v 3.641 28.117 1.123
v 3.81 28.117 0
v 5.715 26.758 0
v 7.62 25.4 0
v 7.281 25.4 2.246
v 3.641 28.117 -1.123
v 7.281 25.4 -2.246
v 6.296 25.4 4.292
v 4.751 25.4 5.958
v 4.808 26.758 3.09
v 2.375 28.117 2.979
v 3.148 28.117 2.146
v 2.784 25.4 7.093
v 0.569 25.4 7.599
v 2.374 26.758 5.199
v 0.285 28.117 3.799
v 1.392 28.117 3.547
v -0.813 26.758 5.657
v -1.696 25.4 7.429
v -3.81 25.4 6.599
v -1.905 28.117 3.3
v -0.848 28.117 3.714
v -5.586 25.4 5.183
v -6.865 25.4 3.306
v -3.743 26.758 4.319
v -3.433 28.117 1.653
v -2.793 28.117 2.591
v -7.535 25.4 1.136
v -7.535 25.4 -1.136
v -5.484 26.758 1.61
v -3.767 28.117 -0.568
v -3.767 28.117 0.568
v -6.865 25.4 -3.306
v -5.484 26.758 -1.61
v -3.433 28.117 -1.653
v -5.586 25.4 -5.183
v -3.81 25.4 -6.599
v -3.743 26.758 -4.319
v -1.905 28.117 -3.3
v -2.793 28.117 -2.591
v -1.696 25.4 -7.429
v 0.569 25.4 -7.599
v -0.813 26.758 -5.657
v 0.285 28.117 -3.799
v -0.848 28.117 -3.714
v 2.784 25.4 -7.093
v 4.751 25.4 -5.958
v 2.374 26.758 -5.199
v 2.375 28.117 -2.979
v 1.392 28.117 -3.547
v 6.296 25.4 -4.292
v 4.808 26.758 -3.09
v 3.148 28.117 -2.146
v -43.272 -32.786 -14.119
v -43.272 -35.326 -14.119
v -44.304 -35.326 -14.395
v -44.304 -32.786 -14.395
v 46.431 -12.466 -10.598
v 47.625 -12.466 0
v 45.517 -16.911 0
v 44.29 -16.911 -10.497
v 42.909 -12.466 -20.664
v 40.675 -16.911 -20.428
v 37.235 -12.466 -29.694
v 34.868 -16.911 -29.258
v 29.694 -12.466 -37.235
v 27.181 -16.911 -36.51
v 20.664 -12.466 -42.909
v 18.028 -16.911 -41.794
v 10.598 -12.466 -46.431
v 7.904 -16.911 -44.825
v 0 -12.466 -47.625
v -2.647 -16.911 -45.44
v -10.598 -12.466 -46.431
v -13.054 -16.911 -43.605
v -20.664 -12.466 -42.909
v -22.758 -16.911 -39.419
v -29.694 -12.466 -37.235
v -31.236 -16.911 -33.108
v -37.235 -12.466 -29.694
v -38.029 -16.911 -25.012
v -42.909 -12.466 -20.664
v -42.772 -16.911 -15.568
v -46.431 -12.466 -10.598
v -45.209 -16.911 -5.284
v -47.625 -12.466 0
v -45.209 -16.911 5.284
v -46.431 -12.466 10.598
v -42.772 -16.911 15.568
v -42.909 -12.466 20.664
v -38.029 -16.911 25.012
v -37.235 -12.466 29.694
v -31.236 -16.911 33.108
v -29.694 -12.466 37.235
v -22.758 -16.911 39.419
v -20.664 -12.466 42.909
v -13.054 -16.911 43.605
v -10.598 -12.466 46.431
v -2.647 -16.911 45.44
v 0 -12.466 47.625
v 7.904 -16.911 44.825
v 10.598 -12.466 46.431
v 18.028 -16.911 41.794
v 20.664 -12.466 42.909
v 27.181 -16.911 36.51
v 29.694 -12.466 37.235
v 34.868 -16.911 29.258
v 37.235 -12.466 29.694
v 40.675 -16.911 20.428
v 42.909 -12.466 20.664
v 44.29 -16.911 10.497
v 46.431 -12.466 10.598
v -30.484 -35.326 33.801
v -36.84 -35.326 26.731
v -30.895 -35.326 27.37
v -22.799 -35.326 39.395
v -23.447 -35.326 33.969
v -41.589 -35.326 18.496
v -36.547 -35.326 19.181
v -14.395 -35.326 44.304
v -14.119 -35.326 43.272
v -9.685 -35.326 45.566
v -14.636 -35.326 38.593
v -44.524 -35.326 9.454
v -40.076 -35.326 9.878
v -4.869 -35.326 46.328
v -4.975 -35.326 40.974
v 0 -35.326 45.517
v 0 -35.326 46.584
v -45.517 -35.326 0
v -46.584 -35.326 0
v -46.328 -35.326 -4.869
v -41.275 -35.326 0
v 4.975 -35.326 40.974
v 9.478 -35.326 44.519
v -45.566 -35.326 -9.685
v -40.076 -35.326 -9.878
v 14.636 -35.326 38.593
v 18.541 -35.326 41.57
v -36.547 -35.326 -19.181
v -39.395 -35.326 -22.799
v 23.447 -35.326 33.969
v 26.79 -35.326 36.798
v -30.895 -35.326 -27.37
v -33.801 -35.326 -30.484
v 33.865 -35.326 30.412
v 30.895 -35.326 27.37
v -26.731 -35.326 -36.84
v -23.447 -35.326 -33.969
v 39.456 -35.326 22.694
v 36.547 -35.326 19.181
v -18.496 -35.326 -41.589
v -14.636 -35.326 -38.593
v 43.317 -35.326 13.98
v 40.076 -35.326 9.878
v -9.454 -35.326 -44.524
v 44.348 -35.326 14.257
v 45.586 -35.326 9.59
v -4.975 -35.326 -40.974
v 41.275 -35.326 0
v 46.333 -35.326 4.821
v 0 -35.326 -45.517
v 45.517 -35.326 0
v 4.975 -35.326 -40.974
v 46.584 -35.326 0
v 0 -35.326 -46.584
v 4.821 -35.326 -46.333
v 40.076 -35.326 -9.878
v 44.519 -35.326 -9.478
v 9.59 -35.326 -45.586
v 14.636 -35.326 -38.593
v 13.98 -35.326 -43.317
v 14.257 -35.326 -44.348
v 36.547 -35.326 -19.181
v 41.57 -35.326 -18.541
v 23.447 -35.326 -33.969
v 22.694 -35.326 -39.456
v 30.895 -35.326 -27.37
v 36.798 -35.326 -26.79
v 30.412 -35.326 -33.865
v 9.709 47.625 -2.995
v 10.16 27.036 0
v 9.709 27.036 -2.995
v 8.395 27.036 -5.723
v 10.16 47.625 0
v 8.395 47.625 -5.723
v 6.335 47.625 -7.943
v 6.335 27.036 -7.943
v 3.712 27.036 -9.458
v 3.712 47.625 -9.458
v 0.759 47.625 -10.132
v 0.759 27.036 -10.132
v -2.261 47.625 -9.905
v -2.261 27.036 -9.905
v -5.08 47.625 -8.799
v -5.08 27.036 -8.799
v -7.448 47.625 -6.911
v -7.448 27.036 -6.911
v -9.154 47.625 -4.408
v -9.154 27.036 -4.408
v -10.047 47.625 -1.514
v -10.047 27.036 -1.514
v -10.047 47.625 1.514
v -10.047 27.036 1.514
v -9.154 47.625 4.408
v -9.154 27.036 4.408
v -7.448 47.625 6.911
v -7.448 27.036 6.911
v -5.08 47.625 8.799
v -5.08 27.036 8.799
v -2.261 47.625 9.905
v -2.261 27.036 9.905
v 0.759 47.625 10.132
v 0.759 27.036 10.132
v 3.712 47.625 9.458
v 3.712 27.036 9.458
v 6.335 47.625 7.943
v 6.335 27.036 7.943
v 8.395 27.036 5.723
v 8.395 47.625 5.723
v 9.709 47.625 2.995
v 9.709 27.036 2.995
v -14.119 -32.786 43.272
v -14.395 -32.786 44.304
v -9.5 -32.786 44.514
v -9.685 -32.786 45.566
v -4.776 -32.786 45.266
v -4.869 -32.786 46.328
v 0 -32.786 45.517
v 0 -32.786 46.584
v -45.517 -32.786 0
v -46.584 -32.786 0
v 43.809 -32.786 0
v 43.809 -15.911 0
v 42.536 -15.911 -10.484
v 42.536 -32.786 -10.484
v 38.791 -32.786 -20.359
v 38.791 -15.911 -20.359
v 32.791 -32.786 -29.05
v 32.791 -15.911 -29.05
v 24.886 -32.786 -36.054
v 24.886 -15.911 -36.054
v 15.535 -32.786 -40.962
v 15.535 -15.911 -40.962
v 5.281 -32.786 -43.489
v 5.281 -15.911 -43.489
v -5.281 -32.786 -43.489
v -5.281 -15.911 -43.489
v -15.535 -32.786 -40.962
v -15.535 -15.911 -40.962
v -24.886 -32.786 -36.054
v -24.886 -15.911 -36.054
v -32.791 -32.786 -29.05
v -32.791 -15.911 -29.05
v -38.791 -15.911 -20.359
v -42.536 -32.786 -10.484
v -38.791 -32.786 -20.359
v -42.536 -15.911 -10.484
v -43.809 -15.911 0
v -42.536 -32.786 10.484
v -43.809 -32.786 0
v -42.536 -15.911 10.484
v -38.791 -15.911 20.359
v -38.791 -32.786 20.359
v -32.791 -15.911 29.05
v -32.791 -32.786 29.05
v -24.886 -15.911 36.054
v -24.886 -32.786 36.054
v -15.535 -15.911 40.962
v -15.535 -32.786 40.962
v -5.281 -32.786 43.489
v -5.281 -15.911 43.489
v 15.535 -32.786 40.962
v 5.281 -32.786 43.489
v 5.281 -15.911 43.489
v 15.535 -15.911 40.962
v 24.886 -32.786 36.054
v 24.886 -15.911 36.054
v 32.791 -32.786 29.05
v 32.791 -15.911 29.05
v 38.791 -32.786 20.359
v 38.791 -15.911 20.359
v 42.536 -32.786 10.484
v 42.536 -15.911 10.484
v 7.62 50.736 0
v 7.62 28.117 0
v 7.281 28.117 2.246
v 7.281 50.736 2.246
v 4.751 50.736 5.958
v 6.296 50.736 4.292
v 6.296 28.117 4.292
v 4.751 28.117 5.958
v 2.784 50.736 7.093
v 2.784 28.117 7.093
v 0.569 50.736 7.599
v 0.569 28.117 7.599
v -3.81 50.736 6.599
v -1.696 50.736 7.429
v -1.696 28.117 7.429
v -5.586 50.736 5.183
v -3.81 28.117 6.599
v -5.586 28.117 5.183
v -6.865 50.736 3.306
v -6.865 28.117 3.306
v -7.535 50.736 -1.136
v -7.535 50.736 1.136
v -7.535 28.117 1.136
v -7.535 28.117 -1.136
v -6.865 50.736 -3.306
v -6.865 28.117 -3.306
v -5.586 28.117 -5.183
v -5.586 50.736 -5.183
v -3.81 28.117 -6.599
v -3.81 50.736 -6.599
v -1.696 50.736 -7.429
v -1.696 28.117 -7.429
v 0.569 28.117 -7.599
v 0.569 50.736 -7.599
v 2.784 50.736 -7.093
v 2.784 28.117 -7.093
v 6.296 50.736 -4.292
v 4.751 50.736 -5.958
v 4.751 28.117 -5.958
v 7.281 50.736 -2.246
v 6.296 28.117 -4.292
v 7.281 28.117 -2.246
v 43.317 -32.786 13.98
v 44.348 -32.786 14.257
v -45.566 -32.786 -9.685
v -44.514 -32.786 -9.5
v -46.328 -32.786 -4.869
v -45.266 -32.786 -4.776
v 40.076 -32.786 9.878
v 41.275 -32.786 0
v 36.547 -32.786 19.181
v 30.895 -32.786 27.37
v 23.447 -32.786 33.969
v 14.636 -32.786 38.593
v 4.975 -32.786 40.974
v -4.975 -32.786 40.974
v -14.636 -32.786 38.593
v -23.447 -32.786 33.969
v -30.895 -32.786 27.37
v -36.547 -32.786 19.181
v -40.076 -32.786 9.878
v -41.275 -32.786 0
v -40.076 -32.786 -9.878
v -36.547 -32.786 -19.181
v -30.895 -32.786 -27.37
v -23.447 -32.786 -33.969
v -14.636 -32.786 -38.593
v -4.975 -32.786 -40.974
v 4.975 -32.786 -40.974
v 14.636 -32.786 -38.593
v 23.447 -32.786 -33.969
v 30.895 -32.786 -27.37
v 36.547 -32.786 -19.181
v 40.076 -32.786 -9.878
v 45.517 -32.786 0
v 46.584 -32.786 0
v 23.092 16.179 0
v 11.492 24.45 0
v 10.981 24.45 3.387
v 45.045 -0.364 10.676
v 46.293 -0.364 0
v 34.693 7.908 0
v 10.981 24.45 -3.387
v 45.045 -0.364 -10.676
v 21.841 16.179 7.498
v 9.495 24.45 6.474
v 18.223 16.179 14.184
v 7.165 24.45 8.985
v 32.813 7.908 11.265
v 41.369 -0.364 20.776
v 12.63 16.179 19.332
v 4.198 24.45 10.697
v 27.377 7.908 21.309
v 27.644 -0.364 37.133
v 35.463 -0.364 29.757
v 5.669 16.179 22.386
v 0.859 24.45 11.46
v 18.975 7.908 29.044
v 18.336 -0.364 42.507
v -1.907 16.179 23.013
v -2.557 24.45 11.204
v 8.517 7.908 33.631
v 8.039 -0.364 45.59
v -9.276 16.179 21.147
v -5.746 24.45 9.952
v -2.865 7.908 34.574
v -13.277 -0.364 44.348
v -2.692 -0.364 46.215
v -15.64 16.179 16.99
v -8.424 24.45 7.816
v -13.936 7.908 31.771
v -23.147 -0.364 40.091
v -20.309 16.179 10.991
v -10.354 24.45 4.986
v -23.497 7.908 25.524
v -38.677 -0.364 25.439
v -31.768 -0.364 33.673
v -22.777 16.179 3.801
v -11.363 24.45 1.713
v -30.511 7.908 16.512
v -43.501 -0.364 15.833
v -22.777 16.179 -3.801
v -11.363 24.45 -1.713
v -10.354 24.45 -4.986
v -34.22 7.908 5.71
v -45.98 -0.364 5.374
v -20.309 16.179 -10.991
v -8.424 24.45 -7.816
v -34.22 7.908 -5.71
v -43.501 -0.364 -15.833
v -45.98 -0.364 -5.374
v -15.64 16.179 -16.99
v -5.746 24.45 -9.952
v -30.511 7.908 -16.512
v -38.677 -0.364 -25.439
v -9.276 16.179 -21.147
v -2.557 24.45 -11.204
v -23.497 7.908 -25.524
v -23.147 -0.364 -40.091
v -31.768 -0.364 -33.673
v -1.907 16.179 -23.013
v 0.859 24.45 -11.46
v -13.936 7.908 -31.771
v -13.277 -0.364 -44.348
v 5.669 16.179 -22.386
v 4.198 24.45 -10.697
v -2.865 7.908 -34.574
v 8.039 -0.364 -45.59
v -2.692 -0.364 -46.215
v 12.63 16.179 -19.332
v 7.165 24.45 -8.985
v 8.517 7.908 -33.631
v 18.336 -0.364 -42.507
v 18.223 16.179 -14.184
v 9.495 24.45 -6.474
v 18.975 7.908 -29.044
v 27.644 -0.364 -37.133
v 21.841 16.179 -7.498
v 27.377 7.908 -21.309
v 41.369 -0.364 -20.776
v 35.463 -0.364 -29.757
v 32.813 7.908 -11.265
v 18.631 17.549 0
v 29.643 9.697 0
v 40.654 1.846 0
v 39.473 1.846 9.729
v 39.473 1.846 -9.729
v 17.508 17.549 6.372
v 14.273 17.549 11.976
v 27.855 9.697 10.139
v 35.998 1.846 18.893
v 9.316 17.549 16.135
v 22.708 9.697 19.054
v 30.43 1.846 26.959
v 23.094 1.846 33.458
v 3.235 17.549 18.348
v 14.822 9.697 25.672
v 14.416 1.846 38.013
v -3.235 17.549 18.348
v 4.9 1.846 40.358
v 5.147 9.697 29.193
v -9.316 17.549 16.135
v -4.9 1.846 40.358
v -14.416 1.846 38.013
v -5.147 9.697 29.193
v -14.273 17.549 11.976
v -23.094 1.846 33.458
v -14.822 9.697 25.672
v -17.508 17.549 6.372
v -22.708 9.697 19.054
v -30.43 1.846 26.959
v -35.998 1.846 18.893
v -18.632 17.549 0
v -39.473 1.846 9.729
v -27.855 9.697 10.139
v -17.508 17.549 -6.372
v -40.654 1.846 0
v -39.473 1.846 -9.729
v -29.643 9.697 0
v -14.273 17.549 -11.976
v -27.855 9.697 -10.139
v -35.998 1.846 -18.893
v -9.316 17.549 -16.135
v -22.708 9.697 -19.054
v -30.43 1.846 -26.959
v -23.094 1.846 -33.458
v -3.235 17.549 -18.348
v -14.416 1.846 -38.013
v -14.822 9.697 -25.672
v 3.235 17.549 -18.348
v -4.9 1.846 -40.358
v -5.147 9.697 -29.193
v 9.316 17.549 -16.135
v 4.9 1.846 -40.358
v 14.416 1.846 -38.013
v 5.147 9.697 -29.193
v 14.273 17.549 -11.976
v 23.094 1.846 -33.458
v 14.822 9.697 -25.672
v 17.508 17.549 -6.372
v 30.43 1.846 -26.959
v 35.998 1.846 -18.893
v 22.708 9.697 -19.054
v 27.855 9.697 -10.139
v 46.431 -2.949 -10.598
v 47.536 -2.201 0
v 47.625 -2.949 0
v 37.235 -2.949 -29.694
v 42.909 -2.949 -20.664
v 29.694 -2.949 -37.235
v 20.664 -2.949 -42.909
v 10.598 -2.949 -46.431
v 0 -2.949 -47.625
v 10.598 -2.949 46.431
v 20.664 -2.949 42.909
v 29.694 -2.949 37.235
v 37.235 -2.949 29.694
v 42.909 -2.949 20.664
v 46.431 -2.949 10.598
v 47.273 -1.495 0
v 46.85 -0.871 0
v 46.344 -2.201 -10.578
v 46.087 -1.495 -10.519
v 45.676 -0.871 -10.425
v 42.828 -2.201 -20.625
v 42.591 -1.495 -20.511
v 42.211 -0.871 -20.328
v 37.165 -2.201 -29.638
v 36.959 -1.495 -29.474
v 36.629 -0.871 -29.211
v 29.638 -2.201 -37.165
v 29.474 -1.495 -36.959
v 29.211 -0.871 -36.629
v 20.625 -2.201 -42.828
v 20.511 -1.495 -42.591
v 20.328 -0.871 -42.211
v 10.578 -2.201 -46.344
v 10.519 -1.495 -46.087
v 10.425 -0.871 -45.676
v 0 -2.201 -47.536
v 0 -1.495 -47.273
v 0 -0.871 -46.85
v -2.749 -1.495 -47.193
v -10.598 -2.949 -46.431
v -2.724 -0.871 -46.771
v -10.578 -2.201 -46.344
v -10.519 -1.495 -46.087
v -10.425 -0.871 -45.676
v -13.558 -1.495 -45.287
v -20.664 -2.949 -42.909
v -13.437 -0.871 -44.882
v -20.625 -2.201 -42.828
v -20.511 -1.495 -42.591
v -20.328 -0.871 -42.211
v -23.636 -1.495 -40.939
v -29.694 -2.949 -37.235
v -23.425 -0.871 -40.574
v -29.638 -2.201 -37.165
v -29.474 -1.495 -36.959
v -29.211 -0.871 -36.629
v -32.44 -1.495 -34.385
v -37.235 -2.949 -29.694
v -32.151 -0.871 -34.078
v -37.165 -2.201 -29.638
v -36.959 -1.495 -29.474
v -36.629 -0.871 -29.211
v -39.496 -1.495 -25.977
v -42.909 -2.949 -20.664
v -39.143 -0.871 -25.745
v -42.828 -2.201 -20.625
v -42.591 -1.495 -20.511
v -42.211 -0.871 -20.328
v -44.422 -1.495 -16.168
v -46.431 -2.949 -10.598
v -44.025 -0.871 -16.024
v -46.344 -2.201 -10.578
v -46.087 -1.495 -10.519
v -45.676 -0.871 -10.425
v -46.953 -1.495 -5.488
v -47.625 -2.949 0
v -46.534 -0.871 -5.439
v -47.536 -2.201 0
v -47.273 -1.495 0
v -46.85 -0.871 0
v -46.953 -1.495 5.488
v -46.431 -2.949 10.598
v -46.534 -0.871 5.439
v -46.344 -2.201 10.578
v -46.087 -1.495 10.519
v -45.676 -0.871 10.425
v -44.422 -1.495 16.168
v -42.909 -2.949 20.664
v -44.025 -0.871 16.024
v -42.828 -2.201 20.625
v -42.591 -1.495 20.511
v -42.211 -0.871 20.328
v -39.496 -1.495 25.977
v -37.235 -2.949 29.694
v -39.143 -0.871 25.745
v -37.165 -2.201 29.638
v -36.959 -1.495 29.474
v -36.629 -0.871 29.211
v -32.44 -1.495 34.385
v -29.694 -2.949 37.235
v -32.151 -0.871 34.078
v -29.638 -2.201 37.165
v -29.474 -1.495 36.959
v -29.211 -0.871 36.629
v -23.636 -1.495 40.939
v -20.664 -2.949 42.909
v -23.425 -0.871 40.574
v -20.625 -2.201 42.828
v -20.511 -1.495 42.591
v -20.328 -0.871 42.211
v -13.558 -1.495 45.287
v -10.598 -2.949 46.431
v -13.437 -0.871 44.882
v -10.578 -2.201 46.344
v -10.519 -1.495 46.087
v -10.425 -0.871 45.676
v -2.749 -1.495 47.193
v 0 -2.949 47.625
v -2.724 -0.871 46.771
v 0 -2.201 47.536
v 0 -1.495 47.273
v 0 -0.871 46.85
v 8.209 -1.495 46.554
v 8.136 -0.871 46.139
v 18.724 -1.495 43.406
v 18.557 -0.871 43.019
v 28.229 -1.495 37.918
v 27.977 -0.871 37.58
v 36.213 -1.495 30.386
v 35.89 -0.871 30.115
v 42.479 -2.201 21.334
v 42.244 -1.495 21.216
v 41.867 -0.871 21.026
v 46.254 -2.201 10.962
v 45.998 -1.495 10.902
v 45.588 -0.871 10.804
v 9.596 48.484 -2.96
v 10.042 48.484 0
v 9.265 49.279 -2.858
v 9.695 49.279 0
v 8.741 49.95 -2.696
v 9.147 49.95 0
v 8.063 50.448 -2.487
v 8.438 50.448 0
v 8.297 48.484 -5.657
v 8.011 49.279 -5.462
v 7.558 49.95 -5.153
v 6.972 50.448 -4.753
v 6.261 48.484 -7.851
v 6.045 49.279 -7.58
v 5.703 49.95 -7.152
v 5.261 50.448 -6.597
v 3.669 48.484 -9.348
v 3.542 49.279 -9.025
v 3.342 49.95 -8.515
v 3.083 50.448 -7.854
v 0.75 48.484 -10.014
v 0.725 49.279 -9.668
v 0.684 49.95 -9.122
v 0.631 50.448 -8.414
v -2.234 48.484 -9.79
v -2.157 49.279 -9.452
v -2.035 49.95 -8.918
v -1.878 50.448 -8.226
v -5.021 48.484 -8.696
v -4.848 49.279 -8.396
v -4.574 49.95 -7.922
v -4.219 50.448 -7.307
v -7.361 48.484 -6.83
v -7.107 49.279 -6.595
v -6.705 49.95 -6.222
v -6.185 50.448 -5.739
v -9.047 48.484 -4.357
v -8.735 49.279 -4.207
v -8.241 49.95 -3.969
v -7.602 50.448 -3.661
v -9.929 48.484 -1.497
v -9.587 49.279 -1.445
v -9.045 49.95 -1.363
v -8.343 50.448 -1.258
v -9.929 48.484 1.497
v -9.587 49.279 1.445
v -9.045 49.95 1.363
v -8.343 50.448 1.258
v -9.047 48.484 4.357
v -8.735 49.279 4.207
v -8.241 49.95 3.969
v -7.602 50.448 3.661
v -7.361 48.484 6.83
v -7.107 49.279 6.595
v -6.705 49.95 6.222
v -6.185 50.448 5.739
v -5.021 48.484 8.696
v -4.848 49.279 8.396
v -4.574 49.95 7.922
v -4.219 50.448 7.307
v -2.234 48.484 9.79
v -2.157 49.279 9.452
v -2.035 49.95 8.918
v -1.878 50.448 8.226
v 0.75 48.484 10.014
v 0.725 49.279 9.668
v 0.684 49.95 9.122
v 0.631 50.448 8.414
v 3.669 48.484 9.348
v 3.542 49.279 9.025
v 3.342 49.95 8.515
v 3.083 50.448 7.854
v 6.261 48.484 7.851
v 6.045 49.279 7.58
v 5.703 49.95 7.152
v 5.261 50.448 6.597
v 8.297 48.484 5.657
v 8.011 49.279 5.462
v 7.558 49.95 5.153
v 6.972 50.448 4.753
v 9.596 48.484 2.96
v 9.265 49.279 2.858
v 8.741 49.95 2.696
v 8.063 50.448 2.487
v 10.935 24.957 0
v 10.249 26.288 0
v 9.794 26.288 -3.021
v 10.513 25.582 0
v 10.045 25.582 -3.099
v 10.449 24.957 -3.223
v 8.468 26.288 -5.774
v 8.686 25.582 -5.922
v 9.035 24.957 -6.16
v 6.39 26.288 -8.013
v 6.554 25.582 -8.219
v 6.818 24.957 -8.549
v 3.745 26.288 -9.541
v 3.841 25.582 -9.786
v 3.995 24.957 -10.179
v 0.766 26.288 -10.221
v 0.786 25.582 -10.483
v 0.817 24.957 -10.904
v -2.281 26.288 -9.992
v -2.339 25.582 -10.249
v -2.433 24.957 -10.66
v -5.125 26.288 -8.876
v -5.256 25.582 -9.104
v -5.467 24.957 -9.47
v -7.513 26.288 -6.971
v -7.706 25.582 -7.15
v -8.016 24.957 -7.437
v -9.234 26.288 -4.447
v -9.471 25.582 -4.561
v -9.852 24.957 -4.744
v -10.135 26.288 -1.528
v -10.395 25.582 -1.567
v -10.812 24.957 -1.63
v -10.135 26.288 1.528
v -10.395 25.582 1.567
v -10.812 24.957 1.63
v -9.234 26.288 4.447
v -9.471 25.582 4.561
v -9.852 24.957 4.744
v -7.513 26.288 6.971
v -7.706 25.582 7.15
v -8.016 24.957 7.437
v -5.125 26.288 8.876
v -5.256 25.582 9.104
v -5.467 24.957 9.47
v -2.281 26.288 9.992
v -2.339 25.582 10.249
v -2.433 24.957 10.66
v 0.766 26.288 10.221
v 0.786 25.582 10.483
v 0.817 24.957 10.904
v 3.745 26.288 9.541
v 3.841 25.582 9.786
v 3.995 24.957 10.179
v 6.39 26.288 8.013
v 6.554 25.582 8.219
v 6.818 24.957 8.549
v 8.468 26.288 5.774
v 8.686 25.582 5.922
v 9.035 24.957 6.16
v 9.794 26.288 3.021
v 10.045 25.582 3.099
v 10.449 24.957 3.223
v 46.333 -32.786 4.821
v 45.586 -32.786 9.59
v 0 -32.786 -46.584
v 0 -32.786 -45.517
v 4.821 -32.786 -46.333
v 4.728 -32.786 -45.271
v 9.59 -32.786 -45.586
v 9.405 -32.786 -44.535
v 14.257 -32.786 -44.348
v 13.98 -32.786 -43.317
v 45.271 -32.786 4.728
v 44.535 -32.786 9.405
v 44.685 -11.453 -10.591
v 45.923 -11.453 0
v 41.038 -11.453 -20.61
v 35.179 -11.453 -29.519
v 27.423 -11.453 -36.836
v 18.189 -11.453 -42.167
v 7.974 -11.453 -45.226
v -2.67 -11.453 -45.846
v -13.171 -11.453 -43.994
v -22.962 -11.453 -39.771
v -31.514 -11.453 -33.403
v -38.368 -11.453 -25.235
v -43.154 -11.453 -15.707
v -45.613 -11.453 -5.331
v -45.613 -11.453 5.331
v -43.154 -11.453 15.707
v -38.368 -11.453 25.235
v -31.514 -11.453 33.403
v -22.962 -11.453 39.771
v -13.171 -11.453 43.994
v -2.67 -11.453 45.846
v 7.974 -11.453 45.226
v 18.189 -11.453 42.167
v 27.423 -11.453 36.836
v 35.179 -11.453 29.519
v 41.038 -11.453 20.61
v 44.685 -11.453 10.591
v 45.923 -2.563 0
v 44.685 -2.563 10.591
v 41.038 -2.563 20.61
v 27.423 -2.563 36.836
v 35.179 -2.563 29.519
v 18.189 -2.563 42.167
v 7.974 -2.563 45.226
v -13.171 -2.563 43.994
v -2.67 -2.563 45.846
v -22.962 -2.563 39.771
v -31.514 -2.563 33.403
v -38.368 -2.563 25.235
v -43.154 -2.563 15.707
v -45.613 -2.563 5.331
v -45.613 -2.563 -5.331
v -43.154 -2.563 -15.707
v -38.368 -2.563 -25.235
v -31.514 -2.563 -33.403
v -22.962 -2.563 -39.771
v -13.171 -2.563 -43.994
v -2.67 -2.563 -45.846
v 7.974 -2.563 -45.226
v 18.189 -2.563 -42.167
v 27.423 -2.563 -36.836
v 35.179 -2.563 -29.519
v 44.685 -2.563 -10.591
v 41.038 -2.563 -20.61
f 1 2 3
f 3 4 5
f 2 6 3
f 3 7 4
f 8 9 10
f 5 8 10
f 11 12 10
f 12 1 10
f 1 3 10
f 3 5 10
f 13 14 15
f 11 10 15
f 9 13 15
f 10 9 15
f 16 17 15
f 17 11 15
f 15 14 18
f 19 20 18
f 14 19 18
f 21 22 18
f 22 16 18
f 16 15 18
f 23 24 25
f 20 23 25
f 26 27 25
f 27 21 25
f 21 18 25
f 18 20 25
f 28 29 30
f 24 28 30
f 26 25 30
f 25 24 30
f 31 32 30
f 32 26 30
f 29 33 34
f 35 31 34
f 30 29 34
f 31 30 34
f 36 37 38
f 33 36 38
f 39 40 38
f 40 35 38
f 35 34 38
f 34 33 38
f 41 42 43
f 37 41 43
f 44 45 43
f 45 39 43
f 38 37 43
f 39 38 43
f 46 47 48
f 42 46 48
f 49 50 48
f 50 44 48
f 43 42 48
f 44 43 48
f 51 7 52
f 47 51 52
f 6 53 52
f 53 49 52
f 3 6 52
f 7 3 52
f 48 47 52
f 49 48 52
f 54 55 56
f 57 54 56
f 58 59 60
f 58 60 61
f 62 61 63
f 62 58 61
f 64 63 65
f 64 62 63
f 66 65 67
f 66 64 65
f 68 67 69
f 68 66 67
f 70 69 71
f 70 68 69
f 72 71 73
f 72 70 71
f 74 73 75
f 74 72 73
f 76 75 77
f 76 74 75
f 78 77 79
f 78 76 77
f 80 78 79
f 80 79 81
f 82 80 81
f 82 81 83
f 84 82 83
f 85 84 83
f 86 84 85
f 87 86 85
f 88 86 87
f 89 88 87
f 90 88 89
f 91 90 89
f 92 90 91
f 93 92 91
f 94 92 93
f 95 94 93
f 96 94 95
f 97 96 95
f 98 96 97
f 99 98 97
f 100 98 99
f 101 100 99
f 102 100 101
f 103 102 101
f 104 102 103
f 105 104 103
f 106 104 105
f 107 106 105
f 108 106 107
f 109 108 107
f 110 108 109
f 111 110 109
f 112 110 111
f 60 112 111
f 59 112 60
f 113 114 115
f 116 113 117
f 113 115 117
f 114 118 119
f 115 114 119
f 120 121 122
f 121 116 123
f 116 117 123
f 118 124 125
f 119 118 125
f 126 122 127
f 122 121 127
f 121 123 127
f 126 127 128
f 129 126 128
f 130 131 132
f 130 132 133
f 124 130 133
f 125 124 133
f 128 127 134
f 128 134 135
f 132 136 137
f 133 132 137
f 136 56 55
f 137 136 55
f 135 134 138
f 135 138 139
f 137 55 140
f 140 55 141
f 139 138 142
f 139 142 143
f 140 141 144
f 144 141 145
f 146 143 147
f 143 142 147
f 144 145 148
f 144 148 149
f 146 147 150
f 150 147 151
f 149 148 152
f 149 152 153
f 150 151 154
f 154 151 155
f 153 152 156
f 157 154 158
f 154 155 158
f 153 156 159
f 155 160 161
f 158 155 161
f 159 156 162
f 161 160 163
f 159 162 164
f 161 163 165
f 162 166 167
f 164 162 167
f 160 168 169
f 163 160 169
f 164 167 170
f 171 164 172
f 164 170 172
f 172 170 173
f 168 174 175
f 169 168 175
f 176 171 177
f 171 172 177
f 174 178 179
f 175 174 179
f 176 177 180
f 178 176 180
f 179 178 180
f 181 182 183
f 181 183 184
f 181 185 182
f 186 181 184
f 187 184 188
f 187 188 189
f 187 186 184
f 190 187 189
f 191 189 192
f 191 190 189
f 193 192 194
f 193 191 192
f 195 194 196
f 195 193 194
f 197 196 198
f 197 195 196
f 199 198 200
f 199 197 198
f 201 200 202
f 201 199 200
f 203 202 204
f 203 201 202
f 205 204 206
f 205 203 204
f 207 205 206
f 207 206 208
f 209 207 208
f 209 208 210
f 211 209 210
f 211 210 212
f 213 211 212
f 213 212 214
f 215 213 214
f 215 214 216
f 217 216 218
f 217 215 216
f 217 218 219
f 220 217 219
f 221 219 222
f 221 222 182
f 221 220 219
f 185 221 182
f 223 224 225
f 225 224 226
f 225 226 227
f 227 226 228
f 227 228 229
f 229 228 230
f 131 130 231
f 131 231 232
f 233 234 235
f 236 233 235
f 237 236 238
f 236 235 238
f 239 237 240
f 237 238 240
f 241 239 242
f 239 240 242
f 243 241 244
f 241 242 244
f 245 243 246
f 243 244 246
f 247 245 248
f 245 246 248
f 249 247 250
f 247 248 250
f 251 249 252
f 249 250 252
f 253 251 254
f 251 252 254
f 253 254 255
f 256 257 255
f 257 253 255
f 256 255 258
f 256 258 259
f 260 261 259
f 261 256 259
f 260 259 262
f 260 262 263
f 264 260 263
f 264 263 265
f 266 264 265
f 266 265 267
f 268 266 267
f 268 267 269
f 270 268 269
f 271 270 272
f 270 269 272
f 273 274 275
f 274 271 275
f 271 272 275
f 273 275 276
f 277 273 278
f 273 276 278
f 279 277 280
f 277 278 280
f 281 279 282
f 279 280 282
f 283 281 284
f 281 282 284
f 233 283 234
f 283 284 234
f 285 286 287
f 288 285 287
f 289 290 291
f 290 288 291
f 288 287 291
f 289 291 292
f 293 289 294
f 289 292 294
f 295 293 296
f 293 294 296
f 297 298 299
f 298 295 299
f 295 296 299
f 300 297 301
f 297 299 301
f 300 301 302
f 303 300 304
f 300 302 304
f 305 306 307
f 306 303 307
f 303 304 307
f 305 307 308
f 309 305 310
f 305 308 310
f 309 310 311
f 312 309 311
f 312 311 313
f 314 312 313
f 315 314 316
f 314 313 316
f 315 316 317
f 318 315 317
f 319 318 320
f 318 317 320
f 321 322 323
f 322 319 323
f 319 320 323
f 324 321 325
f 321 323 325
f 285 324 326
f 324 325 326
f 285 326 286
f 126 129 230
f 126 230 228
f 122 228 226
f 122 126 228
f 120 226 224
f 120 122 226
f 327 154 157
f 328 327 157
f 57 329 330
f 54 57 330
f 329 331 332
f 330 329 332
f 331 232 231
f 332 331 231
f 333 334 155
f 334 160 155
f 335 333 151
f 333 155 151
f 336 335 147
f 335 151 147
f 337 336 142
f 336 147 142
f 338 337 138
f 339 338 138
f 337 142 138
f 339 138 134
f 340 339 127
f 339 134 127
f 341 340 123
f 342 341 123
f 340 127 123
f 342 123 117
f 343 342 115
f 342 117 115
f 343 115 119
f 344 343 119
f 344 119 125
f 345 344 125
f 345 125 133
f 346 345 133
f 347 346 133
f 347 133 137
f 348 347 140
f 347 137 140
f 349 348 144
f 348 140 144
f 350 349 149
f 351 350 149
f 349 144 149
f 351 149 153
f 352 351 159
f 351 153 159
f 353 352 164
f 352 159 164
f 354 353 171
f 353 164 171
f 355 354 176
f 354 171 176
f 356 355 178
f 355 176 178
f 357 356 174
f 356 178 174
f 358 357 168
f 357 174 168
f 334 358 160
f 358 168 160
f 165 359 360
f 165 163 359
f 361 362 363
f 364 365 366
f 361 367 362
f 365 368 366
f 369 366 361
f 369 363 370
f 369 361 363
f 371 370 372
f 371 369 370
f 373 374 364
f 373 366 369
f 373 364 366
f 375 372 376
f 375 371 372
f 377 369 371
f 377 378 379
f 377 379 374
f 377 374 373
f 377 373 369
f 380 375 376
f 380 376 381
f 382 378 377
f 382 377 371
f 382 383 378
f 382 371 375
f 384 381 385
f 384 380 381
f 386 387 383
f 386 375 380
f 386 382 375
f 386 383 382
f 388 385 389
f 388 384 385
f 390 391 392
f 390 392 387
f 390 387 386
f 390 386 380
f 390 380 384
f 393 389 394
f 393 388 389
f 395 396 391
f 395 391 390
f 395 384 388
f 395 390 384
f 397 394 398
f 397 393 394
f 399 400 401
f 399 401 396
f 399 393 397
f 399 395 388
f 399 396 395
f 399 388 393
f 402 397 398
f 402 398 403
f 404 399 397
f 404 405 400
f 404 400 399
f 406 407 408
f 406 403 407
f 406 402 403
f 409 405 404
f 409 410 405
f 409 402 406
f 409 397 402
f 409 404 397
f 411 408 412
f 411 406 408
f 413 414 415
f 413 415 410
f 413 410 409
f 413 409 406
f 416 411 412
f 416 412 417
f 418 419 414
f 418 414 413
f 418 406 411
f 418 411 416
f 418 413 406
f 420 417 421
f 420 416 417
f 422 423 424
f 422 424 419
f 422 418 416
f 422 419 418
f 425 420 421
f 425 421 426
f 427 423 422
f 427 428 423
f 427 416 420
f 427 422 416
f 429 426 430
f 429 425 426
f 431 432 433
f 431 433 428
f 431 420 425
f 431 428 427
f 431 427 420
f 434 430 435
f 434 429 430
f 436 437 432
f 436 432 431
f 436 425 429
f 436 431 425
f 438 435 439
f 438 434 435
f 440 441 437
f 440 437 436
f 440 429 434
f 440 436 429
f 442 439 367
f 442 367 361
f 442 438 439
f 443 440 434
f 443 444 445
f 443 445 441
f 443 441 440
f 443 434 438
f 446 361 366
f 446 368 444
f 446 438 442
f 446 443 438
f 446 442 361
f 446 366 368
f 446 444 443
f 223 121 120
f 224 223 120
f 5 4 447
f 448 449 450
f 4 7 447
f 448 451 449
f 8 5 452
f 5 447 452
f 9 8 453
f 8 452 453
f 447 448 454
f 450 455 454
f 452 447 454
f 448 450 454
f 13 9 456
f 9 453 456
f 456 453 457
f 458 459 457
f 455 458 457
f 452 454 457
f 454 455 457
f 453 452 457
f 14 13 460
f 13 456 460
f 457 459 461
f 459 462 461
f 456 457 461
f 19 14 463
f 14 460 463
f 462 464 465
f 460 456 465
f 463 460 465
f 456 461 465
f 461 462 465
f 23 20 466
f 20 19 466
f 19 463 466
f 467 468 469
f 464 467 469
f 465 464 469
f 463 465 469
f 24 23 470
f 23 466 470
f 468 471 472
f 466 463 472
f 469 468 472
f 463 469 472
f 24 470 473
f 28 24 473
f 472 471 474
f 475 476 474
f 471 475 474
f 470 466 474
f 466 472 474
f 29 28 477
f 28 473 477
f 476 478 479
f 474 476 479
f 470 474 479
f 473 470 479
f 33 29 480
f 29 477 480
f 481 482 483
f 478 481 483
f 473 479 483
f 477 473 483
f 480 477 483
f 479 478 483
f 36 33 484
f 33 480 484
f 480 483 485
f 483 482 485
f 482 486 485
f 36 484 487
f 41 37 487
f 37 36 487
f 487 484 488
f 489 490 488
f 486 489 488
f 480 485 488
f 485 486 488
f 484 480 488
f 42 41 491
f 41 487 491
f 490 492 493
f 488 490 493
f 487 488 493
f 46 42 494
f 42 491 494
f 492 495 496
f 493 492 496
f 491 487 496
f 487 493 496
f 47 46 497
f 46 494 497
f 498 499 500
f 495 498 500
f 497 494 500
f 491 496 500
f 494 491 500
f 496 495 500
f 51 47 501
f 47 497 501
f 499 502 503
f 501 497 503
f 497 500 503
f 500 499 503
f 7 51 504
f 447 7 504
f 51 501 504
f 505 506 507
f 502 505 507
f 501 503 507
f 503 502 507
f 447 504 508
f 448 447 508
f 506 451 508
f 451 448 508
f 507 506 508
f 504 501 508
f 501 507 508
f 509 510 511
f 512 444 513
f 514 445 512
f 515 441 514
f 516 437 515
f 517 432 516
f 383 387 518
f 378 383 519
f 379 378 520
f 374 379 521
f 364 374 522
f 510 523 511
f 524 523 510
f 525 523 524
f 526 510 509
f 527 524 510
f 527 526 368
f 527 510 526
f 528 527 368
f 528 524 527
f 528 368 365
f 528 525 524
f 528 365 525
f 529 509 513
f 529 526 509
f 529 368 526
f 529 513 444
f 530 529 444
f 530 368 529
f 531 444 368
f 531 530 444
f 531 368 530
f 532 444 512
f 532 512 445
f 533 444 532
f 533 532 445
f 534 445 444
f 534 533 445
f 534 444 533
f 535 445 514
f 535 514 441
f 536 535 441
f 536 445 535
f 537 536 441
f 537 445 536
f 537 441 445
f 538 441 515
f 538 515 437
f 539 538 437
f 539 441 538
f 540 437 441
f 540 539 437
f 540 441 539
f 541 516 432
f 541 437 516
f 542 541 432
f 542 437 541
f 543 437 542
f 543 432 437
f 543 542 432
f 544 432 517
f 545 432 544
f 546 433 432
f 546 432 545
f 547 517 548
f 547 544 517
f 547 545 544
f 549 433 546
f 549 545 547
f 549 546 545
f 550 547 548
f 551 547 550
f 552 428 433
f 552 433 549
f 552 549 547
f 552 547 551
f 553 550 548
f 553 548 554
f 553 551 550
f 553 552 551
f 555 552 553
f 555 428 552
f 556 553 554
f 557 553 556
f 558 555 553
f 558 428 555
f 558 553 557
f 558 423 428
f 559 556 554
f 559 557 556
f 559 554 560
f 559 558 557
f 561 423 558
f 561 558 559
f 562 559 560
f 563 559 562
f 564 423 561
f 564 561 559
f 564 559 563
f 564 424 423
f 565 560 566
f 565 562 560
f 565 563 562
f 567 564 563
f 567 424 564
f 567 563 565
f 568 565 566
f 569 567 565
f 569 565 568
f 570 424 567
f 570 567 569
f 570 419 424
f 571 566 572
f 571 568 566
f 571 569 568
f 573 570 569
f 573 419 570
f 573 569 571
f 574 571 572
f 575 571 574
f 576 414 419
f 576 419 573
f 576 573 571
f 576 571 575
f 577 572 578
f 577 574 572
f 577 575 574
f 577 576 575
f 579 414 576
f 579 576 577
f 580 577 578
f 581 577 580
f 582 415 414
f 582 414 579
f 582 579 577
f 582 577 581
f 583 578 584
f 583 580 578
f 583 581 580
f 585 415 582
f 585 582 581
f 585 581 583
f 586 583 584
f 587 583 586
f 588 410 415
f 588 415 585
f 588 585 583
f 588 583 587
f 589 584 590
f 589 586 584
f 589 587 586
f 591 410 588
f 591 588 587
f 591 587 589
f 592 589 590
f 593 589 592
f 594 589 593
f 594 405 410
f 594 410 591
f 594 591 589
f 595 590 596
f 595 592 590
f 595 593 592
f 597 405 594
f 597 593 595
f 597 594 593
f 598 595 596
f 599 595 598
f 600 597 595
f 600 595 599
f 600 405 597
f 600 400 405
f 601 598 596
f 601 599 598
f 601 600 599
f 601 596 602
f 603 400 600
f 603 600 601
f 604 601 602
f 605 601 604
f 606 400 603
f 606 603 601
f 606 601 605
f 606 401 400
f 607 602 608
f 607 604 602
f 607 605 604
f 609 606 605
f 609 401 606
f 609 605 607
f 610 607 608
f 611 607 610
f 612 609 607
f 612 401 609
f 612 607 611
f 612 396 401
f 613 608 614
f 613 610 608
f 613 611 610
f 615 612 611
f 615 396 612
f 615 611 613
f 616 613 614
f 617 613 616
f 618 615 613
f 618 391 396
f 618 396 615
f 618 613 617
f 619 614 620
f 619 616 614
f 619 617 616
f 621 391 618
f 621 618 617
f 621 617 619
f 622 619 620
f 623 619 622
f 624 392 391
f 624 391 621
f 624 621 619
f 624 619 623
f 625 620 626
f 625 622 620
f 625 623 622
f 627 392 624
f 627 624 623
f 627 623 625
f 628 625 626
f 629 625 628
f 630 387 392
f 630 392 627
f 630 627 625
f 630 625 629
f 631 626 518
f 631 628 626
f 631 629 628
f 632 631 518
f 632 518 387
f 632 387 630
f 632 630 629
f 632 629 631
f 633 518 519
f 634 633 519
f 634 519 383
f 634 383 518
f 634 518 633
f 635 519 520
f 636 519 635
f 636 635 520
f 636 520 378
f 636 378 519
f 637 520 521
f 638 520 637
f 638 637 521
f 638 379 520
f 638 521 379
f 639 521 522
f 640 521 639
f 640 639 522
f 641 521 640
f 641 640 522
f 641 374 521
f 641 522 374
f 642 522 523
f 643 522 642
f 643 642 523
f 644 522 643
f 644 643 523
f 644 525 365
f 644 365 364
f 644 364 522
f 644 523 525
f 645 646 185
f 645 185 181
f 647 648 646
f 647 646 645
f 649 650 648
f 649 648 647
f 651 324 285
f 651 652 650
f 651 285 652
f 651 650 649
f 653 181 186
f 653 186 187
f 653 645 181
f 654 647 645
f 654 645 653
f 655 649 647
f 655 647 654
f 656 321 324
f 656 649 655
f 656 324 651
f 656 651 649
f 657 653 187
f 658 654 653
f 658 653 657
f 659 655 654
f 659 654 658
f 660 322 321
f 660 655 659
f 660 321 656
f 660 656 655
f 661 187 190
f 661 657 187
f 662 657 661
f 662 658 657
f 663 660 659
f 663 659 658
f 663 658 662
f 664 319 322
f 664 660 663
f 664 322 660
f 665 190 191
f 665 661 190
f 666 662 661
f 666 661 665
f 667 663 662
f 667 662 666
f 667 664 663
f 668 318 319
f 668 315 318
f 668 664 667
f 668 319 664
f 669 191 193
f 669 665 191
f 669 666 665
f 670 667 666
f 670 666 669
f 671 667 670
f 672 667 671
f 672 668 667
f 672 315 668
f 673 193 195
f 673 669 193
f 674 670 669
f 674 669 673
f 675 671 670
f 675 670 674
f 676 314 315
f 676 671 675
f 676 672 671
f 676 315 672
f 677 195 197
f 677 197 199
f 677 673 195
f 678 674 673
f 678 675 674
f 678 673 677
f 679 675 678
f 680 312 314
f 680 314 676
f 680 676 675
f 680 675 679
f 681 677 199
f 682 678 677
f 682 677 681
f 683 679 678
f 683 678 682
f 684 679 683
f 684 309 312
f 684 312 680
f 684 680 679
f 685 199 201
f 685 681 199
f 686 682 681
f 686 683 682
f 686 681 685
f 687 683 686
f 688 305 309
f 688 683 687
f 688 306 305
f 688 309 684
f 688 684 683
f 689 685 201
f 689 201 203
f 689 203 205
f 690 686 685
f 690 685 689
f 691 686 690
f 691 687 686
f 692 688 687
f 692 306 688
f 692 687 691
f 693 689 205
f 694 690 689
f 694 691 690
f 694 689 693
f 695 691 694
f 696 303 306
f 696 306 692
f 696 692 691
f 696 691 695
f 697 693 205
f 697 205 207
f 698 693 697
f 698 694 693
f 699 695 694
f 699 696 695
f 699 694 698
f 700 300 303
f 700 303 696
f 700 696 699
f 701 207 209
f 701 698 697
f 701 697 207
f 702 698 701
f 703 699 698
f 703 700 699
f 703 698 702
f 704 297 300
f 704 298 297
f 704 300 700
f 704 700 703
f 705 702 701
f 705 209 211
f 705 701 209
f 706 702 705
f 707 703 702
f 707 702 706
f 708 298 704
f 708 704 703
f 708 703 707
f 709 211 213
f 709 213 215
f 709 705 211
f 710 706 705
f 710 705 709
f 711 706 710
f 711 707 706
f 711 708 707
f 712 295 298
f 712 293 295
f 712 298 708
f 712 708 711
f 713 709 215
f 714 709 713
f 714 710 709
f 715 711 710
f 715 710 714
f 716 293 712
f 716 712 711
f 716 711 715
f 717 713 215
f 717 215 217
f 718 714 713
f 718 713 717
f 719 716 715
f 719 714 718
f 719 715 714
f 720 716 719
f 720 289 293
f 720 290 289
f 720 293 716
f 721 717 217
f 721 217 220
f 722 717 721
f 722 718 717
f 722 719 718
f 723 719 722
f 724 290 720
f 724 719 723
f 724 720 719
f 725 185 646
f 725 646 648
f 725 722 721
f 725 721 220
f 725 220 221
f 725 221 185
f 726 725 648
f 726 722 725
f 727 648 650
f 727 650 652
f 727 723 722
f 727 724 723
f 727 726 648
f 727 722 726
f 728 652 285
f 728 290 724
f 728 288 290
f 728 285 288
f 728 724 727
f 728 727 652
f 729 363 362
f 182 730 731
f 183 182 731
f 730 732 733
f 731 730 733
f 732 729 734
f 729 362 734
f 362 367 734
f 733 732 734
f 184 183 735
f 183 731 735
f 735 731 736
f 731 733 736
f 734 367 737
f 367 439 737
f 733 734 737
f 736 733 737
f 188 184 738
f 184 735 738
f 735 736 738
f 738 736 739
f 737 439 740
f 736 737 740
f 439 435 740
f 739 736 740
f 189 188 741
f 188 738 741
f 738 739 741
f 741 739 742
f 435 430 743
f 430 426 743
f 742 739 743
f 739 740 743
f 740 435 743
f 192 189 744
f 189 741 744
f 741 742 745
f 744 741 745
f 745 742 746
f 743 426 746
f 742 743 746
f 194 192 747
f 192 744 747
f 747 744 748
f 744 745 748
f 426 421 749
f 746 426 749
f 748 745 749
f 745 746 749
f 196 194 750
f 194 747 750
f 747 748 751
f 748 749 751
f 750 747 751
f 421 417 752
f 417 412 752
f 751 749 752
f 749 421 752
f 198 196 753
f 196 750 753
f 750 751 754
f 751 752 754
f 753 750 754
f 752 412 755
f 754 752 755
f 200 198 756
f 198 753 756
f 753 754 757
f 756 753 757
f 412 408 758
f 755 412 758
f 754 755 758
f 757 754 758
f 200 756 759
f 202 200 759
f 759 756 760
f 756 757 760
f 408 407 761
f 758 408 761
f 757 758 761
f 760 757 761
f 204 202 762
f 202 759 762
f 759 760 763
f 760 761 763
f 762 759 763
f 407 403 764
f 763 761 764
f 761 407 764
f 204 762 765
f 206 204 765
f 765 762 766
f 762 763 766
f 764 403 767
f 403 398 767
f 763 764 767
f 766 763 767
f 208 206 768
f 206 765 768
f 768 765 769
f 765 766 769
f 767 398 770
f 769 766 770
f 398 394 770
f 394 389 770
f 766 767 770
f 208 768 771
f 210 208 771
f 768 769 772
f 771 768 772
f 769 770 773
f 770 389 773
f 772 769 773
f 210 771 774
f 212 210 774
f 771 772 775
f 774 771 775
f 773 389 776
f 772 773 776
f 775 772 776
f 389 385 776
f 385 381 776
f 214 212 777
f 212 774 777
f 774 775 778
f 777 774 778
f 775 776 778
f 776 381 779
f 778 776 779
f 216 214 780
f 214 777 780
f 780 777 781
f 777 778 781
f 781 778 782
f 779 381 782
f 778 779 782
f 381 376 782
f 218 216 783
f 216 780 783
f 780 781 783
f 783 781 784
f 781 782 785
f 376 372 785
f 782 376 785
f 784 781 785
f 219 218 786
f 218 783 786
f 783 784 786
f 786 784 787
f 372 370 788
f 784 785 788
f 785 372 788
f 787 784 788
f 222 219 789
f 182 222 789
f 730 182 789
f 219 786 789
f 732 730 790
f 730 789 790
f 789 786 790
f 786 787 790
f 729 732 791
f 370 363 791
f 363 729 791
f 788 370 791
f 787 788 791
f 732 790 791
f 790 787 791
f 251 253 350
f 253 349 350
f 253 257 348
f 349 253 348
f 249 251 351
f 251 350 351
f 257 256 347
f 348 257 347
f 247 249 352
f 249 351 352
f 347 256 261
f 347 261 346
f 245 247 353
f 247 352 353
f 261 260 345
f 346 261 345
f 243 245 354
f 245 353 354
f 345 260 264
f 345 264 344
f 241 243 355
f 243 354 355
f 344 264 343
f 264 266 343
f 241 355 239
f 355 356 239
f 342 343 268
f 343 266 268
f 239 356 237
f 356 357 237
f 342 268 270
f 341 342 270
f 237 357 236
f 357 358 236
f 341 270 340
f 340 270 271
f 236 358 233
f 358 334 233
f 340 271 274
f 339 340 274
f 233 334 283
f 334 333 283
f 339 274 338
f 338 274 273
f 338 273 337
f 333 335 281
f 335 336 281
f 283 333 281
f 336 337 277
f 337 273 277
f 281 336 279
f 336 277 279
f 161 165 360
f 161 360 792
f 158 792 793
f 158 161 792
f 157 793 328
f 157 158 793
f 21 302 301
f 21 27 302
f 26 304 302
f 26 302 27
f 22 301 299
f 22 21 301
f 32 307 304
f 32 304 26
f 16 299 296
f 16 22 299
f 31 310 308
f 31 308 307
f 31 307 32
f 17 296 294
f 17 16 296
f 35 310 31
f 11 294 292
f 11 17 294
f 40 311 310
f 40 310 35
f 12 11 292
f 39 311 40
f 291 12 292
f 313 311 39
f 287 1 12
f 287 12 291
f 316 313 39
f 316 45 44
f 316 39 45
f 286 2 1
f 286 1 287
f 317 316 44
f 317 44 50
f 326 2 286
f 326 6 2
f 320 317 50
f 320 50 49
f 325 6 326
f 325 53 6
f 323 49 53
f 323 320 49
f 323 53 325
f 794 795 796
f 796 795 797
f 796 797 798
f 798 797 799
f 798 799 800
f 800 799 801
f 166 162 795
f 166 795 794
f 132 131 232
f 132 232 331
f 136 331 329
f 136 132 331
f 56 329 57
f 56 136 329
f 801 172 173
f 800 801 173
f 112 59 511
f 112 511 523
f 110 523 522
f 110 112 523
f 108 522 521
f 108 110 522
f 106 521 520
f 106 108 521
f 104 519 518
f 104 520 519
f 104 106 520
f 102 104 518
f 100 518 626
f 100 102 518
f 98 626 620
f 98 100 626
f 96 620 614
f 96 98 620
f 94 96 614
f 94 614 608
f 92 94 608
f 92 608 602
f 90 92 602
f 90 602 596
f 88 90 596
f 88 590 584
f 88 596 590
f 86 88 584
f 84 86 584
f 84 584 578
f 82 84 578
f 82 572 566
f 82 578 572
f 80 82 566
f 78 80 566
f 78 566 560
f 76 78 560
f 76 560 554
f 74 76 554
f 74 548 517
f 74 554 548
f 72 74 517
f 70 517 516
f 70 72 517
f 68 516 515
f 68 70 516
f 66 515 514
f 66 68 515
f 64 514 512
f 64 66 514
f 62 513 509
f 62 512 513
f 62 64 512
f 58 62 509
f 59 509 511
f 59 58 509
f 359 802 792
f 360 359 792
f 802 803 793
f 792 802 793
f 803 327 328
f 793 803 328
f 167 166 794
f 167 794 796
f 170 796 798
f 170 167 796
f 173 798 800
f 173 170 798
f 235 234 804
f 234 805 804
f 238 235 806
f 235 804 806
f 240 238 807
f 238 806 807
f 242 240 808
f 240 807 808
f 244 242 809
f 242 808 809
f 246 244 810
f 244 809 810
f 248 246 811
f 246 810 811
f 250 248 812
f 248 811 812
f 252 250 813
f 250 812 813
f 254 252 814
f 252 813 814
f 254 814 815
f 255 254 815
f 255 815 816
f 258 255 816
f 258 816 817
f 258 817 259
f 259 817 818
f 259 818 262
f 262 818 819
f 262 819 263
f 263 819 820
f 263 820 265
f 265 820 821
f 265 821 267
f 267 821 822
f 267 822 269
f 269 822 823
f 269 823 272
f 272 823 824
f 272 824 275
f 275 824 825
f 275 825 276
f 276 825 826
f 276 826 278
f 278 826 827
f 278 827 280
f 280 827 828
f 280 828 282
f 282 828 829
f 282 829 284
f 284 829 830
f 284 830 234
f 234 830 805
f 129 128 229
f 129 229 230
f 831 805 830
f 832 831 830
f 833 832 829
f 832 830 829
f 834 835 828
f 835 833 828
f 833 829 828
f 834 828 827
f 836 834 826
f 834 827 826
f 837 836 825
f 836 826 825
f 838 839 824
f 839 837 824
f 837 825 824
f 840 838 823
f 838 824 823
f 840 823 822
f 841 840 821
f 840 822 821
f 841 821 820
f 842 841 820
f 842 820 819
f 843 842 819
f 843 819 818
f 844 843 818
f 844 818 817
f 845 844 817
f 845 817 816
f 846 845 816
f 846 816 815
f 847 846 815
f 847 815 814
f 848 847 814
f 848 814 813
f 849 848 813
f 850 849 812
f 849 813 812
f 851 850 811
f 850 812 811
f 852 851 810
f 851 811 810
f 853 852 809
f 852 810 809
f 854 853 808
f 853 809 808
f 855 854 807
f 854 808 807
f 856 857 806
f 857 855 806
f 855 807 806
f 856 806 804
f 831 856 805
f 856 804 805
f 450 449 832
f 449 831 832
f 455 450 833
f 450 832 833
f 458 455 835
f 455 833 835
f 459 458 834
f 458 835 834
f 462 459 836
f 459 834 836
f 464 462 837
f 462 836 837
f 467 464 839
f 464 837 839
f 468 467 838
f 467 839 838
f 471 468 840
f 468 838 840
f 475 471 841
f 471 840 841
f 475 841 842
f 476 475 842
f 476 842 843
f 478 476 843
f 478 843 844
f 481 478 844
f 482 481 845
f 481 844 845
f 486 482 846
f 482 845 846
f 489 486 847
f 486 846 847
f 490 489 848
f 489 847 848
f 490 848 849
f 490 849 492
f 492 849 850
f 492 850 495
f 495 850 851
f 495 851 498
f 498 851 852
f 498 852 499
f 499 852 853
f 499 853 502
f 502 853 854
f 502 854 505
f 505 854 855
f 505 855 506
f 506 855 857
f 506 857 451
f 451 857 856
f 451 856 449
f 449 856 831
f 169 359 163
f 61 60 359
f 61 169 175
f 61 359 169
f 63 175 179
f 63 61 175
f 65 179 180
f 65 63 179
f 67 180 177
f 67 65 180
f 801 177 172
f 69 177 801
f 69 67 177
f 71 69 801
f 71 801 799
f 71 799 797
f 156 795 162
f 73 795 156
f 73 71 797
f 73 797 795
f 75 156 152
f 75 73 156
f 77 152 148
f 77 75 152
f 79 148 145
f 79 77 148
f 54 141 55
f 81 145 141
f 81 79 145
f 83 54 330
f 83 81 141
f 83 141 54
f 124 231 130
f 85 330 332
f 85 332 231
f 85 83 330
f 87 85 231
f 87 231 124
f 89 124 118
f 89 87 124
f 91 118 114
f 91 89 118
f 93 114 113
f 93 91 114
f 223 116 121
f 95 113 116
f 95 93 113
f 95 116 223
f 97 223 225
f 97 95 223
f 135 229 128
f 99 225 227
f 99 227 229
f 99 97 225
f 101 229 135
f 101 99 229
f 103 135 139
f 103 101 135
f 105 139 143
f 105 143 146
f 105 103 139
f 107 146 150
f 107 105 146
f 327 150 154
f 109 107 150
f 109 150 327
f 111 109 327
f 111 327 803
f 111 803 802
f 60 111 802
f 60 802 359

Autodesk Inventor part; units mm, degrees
ref_plane "YZ Plane" through (0, 0, 0) normal (1, 0, 0) x (0, 1, 0)
ref_plane "XZ Plane" through (0, 0, 0) normal (0, 1, 0) x (-1, 0, 0)
ref_plane "XY Plane" through (0, 0, 0) normal (0, 0, 1) x (1, 0, 0)
sketch "Sketch2" plane through (0, 0, 0) normal (0, 0, 1) x (1, 0, 0)
  line L0 (0, 0) -> (0, 25.4)
  line L1 (0, 25.4) -> (7.62, 25.4)
  line L2 (7.62, 25.4) -> (9.144, 25.4)
  line L3 (10.9873, 24.8102) -> (46.2933, -0.3635)
  line L4 (40.6545, 1.846) -> (7.62, 25.4)
  line L5 (47.625, -2.9486) -> (47.625, -12.4656)
  line L6 (10.9873, 24.8102) -> (11.4917, 24.4504)
  line L7 (9.144, 25.4) -> (10.16, 25.4)
  line L8 (10.16, 27.0356) -> (10.16, 47.625)
  line L9 (7.62, 50.8) -> (7.62, 25.4)
  line L10 (45.9232, -2.5626) -> (45.9232, -11.4526)
  arc A0 (10.16, 47.625) -> (7.62, 50.7359) centre (6.985, 47.625) ccw
  arc A1 (47.625, -2.9486) -> (46.2933, -0.3635) centre (44.45, -2.9486) ccw
  arc A2 (10.16, 27.0356) -> (11.4917, 24.4504) centre (13.335, 27.0356) ccw
  line L11 (40.6545, 1.846) -> (45.9232, -2.5626)
  line L12 (47.625, -12.4656) -> (45.9232, -11.4526)
  line L13 (45.9232, -2.5626) -> (45.9232, -11.4526)
  line L14 (45.5168, -35.3256) -> (45.5168, -16.9106)
  line L15 (47.625, -12.4656) -> (52.4025, -12.4656) construction
  line L16 (43.8086, -35.3256) -> (43.8086, -15.9112)
  line L17 (45.9232, -2.5626) -> (45.9232, -11.4526)
  line L18 (45.5168, -35.3256) -> (43.8086, -35.3256)
  line L19 (45.5168, -16.9106) -> (45.5168, -35.3256)
  line L20 (47.625, -12.4656) -> (45.5168, -16.9106)
  line L21 (45.9232, -11.4526) -> (43.8086, -15.9112)
  line L22 (7.62, 25.4) -> (3.81, 25.4)
  line L23 (3.81, 25.4) -> (3.81, 32.3365)
  line L24 (7.62, 25.4) -> (3.81, 28.1166)
  line L25 (3.81, 28.1166) -> (7.62, 28.1166)
  point P0 (47.625, -1.313)
  point P1 (10.16, 50.8)
  point P2 (46.1518, -17.3808)
  point P3 (44.9154, -1.7193)
  point P4 (46.1518, -15.158)
  point P5 (42.6103, 0.2095)
  dimension "d9" = 25.4
  dimension "d10" = 7.62
  dimension "d11" = 2.54
  dimension "d16" = 25.4
  dimension "d18" = 3.175
  dimension "d19" = 3.175
  dimension "d24" = 47.625
  dimension "d26" = 8.89
  dimension "d53" = 45.5168
  dimension "d55" = 1.7082
  dimension "d56" = 22.86
  dimension "d68" = 1.7018
  dimension "d84" = 18.415
  dimension "d86" = 3.81
ref_plane "Work Plane1" through (0, -36.5956, 0) normal (0, -1, 0) x (1, 0, 0)
revolve "Revolution5" add sketch "Sketch2" angle 360 about axis through (0, 0, 0) along (0, 1, 0) contours L9 A0 L8 A2 L3 A1 L5 L12 L10 L11 L4 | L24 L25 L9 | L12 L20 L14 L18 L16 L21
sketch "Sketch8" plane through (0, -35.3256, 0) normal (0, -1, 0) x (1, 0, 0)
  circle A0 centre (0, 0) radius 43.8086 projected
  line L0 (0, 43.8086) -> (0, 46.5836)
  line L1 (41.6644, 13.5376) -> (44.3484, 14.2568)
  line L2 (43.8086, 0) -> (46.5836, 0) construction
  line L3 (0, 0) -> (46.5836, 0)
  line L4 (-13.6758, 41.6193) -> (-14.3951, 44.3036)
  line L5 (0, 0) -> (46.5836, 0) construction
  line L6 (-43.8086, 0) -> (-46.5836, 0)
  line L7 (-41.6193, -13.6758) -> (-44.3036, -14.3951)
  line L8 (0, 0) -> (46.5836, 0) construction
  line L9 (0, -43.8086) -> (0, -46.5836)
  line L10 (13.5376, -41.6644) -> (14.2568, -44.3484)
  line L11 (0, 0) -> (46.5836, 0) construction
  arc A1 (0, 46.5836) -> (-14.3951, 44.3036) centre (0, 0) ccw
  arc A2 (-46.5836, 0) -> (-44.3036, -14.3951) centre (0, 0) ccw
  arc A3 (0, -46.5836) -> (14.2568, -44.3484) centre (0, 0) ccw
  arc A4 (46.5836, 0) -> (44.3484, 14.2568) centre (0, 0) ccw
  arc A5 (0, -43.8086) -> (13.5376, -41.6644) centre (0, 0) ccw
  arc A6 (-43.8086, 0) -> (-41.6193, -13.6758) centre (0, 0) ccw
  arc A7 (43.8086, 0) -> (41.6644, 13.5376) centre (0, 0) ccw
  arc A8 (0, 43.8086) -> (-13.6758, 41.6193) centre (0, 0) ccw
  line L12 (46.5836, 0) -> (43.8086, 0)
  circle A9 centre (0, 0) radius 45.5168 projected
  circle A10 centre (0, 0) radius 41.275
  dimension "d72" = 15
  dimension "d75" = 105
  dimension "d78" = 165
  dimension "d81" = 75
  dimension "d85" = 82.55
extrude "Extrusion7" add sketch "Sketch8" against normal blind 2.54 contours A0 | A0 L1 A9 L3 | L10 A9 L9 A0 | A9 L1 A4 L3 | A0 L4 A9 L0 | L10 A3 L9 A9 | A9 L4 A1 L0 | L7 A9 L6 A0 | L7 A2 L6 A9
properties part number "screwflare74"
